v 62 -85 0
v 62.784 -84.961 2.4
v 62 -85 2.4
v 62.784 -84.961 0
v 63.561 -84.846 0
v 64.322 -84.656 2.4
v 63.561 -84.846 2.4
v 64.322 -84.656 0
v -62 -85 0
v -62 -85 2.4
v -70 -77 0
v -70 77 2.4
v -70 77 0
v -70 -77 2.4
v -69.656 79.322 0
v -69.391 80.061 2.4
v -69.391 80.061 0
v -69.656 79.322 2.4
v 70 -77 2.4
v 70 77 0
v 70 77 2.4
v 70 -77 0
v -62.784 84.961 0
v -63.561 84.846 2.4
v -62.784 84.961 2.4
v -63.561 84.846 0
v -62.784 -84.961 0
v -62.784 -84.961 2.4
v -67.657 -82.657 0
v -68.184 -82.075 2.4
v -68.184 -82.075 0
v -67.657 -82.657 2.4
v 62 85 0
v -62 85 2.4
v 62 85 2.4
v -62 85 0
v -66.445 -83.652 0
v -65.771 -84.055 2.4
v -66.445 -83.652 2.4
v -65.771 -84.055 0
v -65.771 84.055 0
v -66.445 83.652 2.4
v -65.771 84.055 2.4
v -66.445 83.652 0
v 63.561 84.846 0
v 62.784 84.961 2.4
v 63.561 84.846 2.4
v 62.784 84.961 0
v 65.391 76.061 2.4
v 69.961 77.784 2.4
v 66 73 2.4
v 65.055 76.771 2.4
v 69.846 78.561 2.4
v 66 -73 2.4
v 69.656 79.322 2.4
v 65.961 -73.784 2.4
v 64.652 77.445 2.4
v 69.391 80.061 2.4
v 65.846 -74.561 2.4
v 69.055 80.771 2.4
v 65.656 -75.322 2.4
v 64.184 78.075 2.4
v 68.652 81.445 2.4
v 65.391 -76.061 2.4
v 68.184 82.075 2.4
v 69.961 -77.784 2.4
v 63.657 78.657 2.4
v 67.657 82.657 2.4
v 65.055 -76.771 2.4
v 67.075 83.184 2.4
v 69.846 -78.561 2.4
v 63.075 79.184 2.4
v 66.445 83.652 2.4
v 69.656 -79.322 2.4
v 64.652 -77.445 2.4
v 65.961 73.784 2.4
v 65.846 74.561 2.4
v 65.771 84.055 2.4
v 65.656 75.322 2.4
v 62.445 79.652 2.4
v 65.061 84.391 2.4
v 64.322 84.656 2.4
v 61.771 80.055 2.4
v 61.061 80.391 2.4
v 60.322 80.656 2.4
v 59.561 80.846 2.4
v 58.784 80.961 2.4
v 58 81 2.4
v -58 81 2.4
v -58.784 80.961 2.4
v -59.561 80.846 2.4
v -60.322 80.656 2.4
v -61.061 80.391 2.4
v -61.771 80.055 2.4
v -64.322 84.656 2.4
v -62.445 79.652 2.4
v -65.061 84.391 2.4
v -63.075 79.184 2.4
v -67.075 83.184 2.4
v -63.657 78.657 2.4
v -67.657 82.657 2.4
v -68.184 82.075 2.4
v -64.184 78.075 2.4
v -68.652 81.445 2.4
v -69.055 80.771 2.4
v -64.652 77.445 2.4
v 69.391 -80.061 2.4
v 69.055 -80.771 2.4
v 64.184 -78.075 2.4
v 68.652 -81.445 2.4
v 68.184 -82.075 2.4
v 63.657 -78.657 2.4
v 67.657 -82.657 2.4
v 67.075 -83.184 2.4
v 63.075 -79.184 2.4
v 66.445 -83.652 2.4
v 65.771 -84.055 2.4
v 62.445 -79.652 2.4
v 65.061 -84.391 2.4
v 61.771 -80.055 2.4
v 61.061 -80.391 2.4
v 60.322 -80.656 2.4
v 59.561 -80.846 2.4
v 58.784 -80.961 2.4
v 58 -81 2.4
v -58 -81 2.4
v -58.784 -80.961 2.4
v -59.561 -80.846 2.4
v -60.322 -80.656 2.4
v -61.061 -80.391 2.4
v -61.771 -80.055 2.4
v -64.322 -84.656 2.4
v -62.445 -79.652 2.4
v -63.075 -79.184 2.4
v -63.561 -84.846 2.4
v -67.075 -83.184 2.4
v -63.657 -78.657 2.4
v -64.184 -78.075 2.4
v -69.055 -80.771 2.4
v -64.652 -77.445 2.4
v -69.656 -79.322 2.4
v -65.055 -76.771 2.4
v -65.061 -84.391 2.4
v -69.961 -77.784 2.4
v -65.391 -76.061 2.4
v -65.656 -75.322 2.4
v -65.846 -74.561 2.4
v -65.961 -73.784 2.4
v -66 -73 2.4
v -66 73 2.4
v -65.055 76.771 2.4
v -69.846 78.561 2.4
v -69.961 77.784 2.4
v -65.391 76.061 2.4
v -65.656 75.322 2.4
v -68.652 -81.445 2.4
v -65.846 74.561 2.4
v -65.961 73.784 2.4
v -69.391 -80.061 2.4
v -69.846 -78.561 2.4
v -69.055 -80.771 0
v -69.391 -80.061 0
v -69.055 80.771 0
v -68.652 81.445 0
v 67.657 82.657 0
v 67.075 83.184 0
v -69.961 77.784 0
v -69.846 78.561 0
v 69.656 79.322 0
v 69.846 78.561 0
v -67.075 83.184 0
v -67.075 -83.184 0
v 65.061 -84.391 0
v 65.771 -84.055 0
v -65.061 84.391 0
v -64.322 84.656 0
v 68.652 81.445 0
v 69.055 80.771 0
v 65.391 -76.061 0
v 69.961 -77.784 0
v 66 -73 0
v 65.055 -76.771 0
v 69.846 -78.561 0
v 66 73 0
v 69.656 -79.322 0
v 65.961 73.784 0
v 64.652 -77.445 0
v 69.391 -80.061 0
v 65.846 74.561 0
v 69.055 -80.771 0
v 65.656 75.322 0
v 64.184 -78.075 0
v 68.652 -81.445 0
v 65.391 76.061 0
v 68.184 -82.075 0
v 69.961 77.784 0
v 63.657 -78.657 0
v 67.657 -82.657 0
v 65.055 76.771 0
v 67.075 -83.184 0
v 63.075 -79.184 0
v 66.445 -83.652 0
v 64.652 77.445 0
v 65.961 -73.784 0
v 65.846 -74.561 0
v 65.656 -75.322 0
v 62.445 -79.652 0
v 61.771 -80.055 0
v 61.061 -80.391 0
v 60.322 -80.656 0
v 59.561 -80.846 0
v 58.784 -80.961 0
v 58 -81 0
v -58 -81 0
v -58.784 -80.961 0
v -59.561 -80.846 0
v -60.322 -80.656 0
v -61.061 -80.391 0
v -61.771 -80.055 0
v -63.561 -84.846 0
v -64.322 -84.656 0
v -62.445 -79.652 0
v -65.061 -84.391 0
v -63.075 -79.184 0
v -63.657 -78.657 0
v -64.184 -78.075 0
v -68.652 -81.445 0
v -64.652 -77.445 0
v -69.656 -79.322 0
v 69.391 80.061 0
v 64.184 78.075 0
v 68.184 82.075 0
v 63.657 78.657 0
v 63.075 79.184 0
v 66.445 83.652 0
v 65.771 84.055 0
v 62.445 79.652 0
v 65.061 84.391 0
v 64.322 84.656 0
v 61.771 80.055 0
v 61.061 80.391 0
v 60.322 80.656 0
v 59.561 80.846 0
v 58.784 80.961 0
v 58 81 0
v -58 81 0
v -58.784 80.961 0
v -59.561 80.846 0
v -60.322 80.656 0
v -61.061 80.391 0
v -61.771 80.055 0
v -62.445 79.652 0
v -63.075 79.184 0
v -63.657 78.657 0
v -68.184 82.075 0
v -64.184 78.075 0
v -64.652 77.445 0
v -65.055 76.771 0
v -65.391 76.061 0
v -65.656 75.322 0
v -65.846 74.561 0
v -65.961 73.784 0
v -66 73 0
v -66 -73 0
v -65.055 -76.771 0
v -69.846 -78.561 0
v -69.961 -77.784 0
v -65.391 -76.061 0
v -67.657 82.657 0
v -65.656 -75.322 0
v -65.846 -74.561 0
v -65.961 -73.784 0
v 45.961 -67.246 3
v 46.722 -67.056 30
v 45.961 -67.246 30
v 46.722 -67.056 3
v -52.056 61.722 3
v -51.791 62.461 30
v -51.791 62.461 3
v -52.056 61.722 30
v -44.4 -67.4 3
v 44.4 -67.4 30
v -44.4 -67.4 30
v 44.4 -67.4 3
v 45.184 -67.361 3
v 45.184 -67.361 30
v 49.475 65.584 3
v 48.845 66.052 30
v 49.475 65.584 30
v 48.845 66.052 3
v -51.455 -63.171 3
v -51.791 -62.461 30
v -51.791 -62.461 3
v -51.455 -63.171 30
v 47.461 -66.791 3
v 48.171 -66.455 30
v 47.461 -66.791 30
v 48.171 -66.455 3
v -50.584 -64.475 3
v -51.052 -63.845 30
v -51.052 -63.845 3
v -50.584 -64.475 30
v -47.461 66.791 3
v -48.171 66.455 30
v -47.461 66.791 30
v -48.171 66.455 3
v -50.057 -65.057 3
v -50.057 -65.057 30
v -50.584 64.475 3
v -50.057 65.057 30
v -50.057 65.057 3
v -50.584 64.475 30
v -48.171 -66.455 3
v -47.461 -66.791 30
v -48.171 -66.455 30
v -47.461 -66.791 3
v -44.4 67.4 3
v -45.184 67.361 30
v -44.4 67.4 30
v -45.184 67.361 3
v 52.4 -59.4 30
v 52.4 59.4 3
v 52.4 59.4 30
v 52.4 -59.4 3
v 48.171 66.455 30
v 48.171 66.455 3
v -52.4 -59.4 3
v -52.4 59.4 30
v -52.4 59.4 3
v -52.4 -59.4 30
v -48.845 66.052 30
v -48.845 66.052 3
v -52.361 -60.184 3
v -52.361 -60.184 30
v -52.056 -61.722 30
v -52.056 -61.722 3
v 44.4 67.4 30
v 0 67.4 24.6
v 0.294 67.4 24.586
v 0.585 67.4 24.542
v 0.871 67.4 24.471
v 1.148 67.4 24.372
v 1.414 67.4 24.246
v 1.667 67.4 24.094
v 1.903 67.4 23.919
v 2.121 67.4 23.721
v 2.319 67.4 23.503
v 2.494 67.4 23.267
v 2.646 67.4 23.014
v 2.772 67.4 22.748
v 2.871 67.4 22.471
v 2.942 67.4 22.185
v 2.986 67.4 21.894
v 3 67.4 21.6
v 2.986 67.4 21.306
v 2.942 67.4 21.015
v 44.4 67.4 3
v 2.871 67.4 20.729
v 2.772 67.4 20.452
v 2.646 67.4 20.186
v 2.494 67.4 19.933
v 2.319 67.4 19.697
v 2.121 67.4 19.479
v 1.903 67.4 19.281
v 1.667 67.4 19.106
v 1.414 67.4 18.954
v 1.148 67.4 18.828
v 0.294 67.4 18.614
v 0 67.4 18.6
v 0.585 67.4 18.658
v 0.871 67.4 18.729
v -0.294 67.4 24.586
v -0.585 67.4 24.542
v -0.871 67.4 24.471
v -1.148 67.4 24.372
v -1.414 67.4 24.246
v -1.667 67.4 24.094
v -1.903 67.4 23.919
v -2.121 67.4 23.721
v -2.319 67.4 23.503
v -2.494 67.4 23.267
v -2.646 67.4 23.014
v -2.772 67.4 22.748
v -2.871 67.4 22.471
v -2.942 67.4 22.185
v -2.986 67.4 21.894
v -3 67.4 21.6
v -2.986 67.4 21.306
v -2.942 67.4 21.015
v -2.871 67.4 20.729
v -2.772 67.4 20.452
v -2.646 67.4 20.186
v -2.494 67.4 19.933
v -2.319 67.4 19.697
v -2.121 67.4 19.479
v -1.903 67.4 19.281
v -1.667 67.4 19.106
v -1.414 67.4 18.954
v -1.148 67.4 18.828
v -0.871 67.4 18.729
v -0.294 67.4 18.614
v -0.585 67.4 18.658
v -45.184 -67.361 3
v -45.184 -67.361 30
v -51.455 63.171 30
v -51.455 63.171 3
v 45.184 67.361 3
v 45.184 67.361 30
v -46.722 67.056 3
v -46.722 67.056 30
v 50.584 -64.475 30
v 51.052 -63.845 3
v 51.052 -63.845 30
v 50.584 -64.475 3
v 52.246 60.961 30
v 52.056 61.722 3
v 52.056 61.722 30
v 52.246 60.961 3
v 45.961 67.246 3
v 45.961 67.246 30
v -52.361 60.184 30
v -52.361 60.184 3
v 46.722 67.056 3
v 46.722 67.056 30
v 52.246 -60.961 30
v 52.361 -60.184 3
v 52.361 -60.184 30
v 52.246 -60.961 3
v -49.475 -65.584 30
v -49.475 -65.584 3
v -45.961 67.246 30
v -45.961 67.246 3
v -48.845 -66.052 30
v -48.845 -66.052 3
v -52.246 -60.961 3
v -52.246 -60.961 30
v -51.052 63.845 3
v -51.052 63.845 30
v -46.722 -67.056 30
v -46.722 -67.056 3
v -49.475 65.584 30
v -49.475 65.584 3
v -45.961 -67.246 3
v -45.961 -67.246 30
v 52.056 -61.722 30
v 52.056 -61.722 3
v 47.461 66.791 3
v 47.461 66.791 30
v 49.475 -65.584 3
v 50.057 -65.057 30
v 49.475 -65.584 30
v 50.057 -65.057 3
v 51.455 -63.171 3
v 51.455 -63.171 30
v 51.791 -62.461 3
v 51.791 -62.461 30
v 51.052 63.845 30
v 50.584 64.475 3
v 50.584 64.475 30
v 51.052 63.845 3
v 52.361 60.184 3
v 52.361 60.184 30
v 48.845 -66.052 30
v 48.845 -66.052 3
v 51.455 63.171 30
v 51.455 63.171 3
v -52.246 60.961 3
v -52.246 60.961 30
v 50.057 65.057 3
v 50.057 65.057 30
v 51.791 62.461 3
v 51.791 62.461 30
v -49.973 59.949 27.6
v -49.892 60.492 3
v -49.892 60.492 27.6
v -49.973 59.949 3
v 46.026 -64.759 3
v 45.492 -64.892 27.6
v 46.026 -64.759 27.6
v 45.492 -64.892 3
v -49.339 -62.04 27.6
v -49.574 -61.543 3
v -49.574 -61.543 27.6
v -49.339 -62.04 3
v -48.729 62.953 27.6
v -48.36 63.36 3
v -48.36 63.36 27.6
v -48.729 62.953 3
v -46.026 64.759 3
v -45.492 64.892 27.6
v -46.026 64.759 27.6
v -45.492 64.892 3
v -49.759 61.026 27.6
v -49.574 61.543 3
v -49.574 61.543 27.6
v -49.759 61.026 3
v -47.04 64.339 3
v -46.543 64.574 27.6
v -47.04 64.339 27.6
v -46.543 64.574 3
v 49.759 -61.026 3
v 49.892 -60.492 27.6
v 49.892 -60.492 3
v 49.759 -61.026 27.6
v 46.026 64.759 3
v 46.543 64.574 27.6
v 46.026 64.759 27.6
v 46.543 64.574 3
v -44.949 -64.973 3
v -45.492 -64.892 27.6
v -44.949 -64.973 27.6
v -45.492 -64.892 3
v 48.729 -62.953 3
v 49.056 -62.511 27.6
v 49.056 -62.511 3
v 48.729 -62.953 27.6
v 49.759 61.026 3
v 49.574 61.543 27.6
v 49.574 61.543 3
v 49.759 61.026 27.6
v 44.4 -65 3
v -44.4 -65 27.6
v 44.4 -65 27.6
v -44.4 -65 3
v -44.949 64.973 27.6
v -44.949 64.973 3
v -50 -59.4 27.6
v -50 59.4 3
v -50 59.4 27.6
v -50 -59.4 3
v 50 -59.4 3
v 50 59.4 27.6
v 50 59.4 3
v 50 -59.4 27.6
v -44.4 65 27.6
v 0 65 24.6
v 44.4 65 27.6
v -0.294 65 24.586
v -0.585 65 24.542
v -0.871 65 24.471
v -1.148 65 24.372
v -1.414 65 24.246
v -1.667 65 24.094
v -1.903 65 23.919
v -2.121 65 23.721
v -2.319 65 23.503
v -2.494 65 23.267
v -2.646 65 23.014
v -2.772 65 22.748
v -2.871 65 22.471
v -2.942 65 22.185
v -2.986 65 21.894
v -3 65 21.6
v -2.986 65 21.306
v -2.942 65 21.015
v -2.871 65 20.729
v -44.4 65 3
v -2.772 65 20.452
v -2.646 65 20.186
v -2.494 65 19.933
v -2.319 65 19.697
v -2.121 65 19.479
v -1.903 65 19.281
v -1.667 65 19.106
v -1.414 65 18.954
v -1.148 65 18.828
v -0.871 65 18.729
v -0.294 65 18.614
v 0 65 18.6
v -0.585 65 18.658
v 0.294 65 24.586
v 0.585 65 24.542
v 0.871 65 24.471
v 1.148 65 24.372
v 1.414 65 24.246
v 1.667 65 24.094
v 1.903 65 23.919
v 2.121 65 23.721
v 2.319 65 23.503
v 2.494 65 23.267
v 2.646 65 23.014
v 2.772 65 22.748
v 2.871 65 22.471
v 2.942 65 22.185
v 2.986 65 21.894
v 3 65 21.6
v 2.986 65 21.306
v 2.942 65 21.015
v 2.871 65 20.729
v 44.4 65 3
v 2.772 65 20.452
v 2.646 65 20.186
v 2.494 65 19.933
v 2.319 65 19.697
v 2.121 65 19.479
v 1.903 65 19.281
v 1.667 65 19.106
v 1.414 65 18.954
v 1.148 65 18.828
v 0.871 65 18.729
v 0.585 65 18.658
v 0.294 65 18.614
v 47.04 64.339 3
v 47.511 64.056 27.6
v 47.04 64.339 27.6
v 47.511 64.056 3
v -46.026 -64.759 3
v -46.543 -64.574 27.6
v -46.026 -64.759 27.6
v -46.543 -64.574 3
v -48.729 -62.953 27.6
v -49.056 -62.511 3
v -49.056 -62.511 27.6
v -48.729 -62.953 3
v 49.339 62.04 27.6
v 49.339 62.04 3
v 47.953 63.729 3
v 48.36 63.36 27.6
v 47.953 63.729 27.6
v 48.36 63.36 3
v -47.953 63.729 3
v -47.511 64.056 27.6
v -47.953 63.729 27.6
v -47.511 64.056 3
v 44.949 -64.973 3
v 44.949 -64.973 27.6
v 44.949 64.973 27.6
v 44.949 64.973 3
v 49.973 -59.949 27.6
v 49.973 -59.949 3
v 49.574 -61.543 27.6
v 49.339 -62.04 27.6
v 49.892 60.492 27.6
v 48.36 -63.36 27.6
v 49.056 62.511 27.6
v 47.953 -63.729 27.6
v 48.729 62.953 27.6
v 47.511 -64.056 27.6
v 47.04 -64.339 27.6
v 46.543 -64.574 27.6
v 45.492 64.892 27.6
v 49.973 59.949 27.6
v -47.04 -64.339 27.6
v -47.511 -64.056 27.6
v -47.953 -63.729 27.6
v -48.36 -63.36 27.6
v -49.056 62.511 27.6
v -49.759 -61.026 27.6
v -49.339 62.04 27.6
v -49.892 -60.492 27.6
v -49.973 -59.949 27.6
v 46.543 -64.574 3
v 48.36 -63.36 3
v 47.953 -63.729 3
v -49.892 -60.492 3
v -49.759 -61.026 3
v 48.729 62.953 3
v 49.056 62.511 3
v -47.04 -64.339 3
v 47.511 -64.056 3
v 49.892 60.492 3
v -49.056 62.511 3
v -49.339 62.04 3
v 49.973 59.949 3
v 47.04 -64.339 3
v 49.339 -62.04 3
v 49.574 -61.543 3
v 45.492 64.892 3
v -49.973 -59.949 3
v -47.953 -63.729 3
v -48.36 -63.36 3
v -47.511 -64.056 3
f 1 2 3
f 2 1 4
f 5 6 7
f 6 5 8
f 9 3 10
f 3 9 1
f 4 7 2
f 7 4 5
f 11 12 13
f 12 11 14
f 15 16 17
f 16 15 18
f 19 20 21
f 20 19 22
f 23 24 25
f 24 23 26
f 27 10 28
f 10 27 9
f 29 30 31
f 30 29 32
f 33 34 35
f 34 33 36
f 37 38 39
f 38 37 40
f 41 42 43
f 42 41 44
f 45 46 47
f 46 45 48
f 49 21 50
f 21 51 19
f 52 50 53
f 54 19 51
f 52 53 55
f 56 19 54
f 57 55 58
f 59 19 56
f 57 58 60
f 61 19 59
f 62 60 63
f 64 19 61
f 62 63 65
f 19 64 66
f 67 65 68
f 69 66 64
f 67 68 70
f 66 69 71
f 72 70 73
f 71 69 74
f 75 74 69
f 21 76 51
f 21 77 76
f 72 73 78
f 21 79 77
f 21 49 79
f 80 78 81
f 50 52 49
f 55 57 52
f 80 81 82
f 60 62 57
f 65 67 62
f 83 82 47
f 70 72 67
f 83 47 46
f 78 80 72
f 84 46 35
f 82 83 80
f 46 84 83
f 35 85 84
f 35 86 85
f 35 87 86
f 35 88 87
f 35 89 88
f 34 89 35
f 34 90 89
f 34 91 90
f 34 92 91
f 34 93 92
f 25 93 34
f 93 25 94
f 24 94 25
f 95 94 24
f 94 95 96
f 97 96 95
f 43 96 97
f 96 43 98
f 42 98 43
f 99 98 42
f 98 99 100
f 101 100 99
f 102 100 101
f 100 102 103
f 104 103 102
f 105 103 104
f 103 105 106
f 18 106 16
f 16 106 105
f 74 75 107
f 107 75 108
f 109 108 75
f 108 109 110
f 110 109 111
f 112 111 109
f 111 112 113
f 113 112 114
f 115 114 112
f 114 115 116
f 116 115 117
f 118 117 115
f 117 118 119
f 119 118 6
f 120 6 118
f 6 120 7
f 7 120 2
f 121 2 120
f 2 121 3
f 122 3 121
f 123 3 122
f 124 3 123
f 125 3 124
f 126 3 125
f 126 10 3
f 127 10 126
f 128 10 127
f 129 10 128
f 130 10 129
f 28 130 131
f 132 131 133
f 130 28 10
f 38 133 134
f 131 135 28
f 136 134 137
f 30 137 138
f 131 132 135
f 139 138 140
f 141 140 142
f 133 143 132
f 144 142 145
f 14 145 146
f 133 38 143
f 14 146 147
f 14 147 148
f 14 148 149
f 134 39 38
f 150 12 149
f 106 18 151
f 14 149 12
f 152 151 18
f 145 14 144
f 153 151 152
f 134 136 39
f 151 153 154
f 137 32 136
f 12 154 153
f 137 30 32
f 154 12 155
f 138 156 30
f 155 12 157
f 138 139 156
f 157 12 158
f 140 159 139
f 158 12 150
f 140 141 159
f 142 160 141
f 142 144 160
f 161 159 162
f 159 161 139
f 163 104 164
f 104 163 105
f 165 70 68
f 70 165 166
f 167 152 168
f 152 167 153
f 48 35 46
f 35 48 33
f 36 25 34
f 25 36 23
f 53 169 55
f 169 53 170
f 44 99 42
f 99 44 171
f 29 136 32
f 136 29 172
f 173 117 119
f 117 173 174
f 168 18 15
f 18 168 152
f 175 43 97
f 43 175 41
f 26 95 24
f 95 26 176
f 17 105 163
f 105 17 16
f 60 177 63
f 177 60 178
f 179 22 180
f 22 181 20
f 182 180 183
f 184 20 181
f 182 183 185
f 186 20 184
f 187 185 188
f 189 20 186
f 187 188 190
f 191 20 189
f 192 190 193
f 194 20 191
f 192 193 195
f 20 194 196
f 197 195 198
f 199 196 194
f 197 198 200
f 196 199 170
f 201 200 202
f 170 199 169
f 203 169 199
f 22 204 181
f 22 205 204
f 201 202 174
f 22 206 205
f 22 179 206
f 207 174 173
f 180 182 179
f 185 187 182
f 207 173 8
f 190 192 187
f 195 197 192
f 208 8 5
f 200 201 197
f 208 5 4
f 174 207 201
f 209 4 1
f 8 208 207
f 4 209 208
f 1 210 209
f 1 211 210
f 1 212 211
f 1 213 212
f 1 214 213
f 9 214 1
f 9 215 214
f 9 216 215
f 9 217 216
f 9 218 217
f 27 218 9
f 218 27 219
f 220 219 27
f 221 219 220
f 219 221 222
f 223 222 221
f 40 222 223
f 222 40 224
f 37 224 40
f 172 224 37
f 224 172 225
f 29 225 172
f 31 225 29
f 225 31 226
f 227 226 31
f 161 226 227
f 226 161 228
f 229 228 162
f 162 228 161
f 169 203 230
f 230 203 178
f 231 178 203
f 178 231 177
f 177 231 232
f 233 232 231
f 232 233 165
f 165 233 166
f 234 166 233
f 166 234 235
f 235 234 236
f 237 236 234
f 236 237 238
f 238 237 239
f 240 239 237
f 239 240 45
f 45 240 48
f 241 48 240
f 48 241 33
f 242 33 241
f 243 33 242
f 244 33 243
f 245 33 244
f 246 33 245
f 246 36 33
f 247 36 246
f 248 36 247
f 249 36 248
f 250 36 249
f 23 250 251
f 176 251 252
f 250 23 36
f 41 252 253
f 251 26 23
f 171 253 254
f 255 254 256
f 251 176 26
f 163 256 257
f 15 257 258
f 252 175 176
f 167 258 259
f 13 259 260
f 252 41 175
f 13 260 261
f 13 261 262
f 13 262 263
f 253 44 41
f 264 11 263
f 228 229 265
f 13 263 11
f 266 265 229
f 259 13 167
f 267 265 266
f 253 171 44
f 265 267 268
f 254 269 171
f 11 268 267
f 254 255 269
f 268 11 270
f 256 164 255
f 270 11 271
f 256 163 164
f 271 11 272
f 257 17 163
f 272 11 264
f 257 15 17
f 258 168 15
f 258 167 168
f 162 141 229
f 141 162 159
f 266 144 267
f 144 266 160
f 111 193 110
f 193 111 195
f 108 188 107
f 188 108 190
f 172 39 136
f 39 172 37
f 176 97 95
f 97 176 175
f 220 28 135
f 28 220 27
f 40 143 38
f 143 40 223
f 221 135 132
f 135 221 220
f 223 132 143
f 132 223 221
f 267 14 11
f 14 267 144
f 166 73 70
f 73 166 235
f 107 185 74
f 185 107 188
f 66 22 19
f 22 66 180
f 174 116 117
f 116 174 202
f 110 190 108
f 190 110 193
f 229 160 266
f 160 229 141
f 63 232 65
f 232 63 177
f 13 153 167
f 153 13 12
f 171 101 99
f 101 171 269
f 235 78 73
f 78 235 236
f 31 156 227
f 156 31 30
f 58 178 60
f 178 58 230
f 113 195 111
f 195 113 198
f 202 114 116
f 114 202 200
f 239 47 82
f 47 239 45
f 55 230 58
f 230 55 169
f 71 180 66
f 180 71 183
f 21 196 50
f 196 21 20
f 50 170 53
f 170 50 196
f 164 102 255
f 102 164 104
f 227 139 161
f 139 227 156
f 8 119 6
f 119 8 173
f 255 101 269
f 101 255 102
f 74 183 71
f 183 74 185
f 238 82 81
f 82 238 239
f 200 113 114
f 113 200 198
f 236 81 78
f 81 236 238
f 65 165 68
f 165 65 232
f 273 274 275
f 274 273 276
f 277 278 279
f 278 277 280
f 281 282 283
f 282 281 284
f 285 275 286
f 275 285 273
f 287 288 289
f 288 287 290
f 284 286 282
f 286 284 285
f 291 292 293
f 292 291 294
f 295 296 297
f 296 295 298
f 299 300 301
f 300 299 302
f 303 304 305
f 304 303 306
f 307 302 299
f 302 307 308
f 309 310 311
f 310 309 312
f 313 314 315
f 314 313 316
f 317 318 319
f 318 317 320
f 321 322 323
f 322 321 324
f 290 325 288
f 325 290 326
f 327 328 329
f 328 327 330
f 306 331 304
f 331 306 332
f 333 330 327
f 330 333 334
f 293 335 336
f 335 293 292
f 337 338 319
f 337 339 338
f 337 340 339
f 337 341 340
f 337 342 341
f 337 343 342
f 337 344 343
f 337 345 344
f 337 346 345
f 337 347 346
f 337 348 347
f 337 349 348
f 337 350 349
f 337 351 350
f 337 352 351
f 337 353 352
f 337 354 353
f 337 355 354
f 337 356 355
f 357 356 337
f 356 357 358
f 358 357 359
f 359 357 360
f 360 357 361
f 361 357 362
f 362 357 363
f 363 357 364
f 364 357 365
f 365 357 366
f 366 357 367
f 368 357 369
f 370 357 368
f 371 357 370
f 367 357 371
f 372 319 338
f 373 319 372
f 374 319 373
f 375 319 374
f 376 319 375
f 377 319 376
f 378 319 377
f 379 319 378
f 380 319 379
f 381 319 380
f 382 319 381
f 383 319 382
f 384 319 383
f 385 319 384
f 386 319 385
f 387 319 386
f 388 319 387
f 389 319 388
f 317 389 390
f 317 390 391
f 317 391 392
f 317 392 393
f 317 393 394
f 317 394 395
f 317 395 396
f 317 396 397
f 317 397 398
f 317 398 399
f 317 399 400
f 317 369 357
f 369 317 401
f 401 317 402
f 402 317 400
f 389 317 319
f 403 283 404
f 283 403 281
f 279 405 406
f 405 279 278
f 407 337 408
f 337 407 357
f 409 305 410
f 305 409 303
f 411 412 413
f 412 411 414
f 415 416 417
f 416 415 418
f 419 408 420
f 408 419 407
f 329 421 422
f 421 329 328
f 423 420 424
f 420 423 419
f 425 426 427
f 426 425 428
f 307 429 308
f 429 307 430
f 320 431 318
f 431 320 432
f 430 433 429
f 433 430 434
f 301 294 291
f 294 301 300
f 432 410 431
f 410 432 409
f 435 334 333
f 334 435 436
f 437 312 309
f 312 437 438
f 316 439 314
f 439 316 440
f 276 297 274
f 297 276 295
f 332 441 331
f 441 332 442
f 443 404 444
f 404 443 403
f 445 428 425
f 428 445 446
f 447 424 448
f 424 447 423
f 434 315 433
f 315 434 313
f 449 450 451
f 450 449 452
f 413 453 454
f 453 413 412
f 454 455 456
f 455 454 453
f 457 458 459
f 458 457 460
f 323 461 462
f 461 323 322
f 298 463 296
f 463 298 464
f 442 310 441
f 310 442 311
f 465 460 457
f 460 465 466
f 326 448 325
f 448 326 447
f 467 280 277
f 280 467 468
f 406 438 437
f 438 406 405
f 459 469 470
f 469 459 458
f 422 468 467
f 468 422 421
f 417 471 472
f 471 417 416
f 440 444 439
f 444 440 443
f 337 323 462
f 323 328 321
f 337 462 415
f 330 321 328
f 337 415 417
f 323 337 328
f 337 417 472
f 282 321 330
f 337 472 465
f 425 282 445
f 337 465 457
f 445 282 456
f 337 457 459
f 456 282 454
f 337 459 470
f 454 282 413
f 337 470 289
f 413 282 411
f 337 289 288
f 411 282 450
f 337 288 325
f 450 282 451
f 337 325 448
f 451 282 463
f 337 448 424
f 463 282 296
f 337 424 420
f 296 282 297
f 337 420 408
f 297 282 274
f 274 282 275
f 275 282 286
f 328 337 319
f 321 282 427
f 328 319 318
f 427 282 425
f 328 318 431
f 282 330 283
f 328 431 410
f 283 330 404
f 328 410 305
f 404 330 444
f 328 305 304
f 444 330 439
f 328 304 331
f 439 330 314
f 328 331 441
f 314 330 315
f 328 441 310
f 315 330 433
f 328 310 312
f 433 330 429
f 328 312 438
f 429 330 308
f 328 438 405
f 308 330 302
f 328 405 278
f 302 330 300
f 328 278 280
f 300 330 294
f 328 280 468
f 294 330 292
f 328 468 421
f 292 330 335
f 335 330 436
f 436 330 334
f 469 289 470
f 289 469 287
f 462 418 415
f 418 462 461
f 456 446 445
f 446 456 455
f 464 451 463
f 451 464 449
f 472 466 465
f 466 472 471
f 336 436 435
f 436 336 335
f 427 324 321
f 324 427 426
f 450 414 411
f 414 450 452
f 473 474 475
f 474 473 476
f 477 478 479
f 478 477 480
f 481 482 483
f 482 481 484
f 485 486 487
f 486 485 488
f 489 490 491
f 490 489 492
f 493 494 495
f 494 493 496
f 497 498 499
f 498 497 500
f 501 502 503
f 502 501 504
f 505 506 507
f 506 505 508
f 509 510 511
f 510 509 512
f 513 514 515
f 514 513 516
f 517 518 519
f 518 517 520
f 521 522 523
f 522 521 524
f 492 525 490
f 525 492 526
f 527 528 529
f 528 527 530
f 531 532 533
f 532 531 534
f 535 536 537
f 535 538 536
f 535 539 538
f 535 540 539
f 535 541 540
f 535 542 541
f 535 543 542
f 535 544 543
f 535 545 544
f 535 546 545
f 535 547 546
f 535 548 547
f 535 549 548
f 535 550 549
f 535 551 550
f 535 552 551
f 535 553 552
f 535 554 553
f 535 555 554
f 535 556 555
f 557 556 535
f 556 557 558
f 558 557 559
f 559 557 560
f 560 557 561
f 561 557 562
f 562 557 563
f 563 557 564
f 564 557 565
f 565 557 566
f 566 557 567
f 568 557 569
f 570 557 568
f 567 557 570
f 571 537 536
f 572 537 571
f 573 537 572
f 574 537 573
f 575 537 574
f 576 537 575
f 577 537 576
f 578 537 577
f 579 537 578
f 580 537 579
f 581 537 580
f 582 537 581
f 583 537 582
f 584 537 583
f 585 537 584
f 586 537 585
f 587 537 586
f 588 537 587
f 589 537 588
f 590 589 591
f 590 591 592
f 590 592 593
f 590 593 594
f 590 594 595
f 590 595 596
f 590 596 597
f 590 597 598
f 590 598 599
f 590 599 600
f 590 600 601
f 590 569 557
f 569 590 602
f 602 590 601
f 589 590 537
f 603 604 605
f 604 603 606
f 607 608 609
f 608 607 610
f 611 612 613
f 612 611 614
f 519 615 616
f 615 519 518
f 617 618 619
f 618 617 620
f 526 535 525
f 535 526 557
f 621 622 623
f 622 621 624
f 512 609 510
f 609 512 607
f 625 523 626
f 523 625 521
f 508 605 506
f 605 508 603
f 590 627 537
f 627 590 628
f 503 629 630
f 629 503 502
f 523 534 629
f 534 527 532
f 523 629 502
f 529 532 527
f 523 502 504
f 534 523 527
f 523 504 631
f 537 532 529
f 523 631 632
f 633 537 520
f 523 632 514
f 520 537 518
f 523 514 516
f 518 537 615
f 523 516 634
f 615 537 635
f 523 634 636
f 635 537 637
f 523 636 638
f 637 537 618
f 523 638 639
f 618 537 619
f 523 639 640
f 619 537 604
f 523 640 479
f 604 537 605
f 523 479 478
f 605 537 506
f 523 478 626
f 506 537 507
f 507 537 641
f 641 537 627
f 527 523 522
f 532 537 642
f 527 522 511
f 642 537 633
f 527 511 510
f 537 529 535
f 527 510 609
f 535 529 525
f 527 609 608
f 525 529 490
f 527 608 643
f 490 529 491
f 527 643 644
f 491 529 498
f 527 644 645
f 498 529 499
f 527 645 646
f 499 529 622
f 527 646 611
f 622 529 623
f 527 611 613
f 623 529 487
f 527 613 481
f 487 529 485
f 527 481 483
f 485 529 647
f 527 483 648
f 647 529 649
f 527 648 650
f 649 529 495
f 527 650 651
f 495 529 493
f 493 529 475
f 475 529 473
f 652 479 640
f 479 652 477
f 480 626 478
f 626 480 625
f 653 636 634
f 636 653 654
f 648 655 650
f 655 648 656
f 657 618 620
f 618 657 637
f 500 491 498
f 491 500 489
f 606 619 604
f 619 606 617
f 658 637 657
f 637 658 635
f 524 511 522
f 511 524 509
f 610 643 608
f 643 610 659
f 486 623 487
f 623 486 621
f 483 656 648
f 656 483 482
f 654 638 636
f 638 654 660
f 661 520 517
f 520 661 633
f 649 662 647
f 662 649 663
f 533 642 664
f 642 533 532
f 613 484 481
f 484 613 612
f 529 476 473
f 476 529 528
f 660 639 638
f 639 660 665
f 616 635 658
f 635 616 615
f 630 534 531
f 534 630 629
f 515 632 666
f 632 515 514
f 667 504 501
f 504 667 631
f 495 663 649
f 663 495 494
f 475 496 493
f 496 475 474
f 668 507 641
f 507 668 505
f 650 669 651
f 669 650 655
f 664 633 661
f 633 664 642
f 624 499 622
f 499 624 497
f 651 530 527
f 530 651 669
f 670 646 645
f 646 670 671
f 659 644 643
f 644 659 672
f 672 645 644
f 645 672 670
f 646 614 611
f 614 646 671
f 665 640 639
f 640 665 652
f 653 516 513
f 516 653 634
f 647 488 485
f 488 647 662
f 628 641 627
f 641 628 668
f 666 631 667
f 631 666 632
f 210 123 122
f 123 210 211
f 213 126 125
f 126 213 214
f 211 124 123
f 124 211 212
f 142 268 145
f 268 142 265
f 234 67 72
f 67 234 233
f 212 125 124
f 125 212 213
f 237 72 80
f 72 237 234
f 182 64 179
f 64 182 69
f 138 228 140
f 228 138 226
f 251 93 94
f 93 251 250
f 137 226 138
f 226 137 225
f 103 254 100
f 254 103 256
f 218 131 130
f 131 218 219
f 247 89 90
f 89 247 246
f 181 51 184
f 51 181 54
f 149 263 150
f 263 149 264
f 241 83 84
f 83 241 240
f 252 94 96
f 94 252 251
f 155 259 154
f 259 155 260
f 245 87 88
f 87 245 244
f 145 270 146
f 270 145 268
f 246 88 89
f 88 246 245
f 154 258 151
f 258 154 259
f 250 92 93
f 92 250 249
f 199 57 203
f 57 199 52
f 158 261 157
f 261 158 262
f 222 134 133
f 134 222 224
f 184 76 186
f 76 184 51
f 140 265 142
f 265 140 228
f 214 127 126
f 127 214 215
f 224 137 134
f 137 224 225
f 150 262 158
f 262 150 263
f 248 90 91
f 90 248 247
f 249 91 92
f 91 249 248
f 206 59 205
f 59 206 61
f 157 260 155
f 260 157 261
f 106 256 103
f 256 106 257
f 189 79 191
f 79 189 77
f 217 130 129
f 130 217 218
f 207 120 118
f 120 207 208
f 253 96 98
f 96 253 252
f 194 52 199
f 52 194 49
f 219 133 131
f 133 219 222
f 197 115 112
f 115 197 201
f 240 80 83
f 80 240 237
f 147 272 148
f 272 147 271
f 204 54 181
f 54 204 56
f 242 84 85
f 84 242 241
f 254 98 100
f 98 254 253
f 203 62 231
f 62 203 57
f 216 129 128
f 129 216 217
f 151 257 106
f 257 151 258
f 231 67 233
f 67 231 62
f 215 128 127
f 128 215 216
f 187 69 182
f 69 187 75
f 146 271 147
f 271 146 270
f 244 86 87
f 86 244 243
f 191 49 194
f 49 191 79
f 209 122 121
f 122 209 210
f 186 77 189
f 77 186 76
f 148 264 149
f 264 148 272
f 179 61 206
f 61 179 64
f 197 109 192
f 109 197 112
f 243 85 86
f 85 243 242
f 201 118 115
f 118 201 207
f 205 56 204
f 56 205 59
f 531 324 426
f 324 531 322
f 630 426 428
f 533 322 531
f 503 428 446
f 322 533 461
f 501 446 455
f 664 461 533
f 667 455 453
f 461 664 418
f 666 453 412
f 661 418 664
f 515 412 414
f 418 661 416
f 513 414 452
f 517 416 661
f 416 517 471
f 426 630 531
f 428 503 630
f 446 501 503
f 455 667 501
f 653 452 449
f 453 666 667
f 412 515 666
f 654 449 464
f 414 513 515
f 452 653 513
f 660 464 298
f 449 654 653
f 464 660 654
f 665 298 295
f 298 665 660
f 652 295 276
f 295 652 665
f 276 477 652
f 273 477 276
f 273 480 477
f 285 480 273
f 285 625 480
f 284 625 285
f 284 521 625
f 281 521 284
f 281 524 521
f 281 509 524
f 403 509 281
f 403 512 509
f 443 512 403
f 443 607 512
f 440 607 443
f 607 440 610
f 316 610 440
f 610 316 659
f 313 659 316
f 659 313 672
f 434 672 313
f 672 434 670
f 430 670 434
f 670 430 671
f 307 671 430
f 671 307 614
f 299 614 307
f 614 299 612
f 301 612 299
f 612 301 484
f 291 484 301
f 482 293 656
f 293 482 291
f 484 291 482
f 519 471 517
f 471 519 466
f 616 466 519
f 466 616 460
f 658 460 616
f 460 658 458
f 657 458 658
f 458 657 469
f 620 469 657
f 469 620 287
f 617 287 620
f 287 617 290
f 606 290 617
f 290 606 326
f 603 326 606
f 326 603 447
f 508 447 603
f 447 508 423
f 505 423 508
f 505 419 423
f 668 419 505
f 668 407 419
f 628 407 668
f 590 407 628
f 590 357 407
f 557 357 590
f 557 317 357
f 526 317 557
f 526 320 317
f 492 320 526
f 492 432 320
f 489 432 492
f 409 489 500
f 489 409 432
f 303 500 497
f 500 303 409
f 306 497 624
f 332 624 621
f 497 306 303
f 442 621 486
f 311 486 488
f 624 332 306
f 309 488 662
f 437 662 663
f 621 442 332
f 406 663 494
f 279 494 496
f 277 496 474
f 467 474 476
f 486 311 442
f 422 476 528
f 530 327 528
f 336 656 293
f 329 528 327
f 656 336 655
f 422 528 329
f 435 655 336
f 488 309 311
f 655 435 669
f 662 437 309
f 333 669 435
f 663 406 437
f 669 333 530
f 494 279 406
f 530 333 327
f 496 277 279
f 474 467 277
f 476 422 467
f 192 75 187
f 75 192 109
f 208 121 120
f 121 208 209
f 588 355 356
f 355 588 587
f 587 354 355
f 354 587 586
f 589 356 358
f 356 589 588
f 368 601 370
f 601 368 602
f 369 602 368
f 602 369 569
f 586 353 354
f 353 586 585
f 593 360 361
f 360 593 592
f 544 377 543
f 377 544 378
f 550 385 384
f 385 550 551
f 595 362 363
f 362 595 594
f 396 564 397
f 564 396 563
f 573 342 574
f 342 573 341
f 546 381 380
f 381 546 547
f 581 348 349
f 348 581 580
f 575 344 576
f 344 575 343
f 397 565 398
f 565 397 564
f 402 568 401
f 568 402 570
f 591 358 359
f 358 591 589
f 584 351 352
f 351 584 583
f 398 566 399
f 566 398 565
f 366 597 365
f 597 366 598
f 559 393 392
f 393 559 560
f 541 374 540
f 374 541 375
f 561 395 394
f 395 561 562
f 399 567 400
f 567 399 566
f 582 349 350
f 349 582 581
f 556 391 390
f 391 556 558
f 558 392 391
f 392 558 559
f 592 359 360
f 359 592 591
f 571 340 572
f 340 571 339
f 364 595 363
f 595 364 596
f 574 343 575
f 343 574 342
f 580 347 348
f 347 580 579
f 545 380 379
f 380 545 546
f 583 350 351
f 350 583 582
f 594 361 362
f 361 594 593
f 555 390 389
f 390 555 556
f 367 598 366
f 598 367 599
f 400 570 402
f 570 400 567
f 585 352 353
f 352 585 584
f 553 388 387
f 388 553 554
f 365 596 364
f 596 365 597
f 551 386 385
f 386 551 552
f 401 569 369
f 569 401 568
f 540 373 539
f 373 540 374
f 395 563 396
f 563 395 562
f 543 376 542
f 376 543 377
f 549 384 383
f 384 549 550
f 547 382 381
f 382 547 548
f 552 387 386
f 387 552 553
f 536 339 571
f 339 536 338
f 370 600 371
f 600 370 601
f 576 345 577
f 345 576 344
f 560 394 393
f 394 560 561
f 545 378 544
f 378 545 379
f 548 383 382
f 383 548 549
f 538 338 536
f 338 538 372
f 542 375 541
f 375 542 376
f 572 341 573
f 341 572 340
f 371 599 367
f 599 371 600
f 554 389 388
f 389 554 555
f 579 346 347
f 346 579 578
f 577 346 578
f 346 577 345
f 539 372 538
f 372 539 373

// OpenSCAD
// file: nido.scad
// Nido — parámetros compartidos del sistema de bisagra libre.
// Todas las medidas en milímetros. Cambia aquí y se actualizan todas las piezas.
//
// Idea: cada panel gira libremente alrededor de un poste redondo, así el corral
// toma cualquier ángulo y se adapta al lugar. Cada extremo del panel lleva dos
// uniones (abajo y arriba) que abrazan el poste. Los extremos izquierdo (A) y
// derecho (B) usan alturas distintas para que dos paneles no choquen en el poste.
//
//        vista de frente, extremo de un panel junto al poste
//
//        │█│   ┌──────────   ← panel
//        │█│ ══╡ B alto      ← unión del panel vecino (su extremo B)
//        │█│ ══╡ A alto      ← unión de este panel (extremo A)
//        │█│   │             ← muesca: el panel se retira para dejar sitio a las
//        │█│   │               uniones; fuera de ella queda a 2 mm del poste
//        │█│ ══╡ B bajo
//        │█│ ══╡ A bajo
//        │█│   └──────────
//       poste
//
// Seguridad (ver docs/seguridad.md):
//   separación entre barrotes 45–60 mm; huecos accesibles < 5 mm.

$fn = 64;

// --- Panel (triplex cortado en CNC) ---
panel_grosor = 18;
panel_alto   = 650;          // punto más alto del borde superior
panel_bajo   = 615;          // punto más bajo del borde superior cuando tiene forma
modulos      = [300, 600, 800];   // distancia entre ejes de poste
holgura      = 0.4;          // tolerancia de impresión y de ajuste

// Barrotes
panel_hueco     = 50;
panel_lateral   = 35;        // montante junto a cada extremo
panel_barra_min = 35;
riel_inf        = 120;       // los huecos empiezan aquí...
hueco_tope      = 520;       // ...y terminan aquí, por debajo de las uniones altas

// --- Poste (varilla redonda de madera) ---
poste_diam  = 40;
tapa_encaje = 20;
poste_alto  = panel_alto + tapa_encaje;

// --- Unión panel–poste ---
borde_eje   = 22;            // del eje del poste al canto del panel (2 mm de hueco)
union_alto  = 30;            // alto de cada unión (anillo, correa o abrazadera)
union_sep   = 3;             // separación vertical entre uniones
union_env_r = 26;            // radio máximo que puede ocupar una unión
muesca_eje  = union_env_r + 3;  // del eje al fondo de la muesca
perno_eje   = 45;            // del eje del poste al perno que fija la unión
perno_diam  = 6.5;           // perno M6

// Altura de la base de cada unión, medida desde el suelo.
z_A_bajo = 40;
z_B_bajo = z_A_bajo + union_alto + union_sep;
z_A_alto = 540;
z_B_alto = z_A_alto + union_alto + union_sep;
bandas_A = [z_A_bajo, z_A_alto];
bandas_B = [z_B_bajo, z_B_alto];

// Muescas: cubren las dos uniones de cada par, con union_sep de margen.
muescas = [[z_A_bajo - union_sep, z_B_bajo + union_alto + union_sep],
           [z_A_alto - union_sep, z_B_alto + union_alto + union_sep]];

function panel_ancho(m) = m - 2 * borde_eje;

// Número de huecos y ancho real de barrote para un panel de ancho físico w.
function panel_n_huecos(w) =
    floor((w - 2 * panel_lateral + panel_barra_min) / (panel_hueco + panel_barra_min));
function panel_barra(w) =
    let (n = panel_n_huecos(w))
    n > 1 ? (w - 2 * panel_lateral - n * panel_hueco) / (n - 1) : 0;

assert(panel_hueco >= 45 && panel_hueco <= 60,
       "panel_hueco fuera del rango seguro (45–60 mm)");
assert(borde_eje - poste_diam / 2 < 5,
       "el hueco entre poste y panel debe ser menor de 5 mm");
assert(muesca_eje - union_env_r < 5 && union_sep < 5,
       "los huecos alrededor de las uniones deben ser menores de 5 mm");
assert(hueco_tope < muescas[1][0] && riel_inf > muescas[0][1],
       "los huecos de los barrotes no pueden cruzar las muescas");
assert(muescas[1][1] < panel_bajo, "las uniones altas deben quedar dentro del panel");
// main file
// Módulo de luz: caja que se atornilla por FUERA de un panel tipo "ventana".
// Desde dentro del corral solo se ve el acrílico opal de la ventana.
// Alimentación USB 5 V con el cable por fuera. Sin pilas.
//
//   openscad -o luz_caja.stl modulo_luz.scad
//
// El difusor es una lámina de acrílico opal de 3 mm (ventana + 20 mm por lado),
// cortada en láser o CNC, que queda apretada entre la caja y el panel.

include <nido.scad>

ventana = [100, 130];        // coincide con panel.scad
ala     = 20;                // cuánto sobresale la brida alrededor de la ventana
fondo   = 30;
pared   = 2.4;
radio   = 8;
acrilico = 3;

externo = [ventana[0] + 2 * ala, ventana[1] + 2 * ala];

module rect_redondeado(tam, r, h) {
    linear_extrude(h) offset(r = r) offset(delta = -r) square(tam, center = true);
}

module caja() {
    difference() {
        union() {
            rect_redondeado(externo, radio, pared);                         // brida
            rect_redondeado(ventana + [2 * pared, 2 * pared], radio, fondo); // cuerpo
        }
        // cavidad abierta hacia el panel, con asiento para el acrílico
        translate([0, 0, -1]) rect_redondeado(ventana, radio - pared, fondo - pared + 1);
        translate([0, 0, -1]) rect_redondeado(ventana + [2 * ala - 8, 2 * ala - 8], radio, acrilico + 1);
        // tornillos para madera 3,5 × 25 mm a través de la brida y el acrílico
        for (x = [-1, 1], y = [-1, 1])
            translate([x * (externo[0] / 2 - ala / 2), y * (externo[1] / 2 - ala / 2), -1])
                cylinder(d = 3.8, h = pared + 2);
        // salida del cable
        translate([0, ventana[1] / 2 - 1, fondo - pared - 6])
            rotate([-90, 0, 0]) cylinder(d = 6, h = pared + 2);
    }
}

caja();
